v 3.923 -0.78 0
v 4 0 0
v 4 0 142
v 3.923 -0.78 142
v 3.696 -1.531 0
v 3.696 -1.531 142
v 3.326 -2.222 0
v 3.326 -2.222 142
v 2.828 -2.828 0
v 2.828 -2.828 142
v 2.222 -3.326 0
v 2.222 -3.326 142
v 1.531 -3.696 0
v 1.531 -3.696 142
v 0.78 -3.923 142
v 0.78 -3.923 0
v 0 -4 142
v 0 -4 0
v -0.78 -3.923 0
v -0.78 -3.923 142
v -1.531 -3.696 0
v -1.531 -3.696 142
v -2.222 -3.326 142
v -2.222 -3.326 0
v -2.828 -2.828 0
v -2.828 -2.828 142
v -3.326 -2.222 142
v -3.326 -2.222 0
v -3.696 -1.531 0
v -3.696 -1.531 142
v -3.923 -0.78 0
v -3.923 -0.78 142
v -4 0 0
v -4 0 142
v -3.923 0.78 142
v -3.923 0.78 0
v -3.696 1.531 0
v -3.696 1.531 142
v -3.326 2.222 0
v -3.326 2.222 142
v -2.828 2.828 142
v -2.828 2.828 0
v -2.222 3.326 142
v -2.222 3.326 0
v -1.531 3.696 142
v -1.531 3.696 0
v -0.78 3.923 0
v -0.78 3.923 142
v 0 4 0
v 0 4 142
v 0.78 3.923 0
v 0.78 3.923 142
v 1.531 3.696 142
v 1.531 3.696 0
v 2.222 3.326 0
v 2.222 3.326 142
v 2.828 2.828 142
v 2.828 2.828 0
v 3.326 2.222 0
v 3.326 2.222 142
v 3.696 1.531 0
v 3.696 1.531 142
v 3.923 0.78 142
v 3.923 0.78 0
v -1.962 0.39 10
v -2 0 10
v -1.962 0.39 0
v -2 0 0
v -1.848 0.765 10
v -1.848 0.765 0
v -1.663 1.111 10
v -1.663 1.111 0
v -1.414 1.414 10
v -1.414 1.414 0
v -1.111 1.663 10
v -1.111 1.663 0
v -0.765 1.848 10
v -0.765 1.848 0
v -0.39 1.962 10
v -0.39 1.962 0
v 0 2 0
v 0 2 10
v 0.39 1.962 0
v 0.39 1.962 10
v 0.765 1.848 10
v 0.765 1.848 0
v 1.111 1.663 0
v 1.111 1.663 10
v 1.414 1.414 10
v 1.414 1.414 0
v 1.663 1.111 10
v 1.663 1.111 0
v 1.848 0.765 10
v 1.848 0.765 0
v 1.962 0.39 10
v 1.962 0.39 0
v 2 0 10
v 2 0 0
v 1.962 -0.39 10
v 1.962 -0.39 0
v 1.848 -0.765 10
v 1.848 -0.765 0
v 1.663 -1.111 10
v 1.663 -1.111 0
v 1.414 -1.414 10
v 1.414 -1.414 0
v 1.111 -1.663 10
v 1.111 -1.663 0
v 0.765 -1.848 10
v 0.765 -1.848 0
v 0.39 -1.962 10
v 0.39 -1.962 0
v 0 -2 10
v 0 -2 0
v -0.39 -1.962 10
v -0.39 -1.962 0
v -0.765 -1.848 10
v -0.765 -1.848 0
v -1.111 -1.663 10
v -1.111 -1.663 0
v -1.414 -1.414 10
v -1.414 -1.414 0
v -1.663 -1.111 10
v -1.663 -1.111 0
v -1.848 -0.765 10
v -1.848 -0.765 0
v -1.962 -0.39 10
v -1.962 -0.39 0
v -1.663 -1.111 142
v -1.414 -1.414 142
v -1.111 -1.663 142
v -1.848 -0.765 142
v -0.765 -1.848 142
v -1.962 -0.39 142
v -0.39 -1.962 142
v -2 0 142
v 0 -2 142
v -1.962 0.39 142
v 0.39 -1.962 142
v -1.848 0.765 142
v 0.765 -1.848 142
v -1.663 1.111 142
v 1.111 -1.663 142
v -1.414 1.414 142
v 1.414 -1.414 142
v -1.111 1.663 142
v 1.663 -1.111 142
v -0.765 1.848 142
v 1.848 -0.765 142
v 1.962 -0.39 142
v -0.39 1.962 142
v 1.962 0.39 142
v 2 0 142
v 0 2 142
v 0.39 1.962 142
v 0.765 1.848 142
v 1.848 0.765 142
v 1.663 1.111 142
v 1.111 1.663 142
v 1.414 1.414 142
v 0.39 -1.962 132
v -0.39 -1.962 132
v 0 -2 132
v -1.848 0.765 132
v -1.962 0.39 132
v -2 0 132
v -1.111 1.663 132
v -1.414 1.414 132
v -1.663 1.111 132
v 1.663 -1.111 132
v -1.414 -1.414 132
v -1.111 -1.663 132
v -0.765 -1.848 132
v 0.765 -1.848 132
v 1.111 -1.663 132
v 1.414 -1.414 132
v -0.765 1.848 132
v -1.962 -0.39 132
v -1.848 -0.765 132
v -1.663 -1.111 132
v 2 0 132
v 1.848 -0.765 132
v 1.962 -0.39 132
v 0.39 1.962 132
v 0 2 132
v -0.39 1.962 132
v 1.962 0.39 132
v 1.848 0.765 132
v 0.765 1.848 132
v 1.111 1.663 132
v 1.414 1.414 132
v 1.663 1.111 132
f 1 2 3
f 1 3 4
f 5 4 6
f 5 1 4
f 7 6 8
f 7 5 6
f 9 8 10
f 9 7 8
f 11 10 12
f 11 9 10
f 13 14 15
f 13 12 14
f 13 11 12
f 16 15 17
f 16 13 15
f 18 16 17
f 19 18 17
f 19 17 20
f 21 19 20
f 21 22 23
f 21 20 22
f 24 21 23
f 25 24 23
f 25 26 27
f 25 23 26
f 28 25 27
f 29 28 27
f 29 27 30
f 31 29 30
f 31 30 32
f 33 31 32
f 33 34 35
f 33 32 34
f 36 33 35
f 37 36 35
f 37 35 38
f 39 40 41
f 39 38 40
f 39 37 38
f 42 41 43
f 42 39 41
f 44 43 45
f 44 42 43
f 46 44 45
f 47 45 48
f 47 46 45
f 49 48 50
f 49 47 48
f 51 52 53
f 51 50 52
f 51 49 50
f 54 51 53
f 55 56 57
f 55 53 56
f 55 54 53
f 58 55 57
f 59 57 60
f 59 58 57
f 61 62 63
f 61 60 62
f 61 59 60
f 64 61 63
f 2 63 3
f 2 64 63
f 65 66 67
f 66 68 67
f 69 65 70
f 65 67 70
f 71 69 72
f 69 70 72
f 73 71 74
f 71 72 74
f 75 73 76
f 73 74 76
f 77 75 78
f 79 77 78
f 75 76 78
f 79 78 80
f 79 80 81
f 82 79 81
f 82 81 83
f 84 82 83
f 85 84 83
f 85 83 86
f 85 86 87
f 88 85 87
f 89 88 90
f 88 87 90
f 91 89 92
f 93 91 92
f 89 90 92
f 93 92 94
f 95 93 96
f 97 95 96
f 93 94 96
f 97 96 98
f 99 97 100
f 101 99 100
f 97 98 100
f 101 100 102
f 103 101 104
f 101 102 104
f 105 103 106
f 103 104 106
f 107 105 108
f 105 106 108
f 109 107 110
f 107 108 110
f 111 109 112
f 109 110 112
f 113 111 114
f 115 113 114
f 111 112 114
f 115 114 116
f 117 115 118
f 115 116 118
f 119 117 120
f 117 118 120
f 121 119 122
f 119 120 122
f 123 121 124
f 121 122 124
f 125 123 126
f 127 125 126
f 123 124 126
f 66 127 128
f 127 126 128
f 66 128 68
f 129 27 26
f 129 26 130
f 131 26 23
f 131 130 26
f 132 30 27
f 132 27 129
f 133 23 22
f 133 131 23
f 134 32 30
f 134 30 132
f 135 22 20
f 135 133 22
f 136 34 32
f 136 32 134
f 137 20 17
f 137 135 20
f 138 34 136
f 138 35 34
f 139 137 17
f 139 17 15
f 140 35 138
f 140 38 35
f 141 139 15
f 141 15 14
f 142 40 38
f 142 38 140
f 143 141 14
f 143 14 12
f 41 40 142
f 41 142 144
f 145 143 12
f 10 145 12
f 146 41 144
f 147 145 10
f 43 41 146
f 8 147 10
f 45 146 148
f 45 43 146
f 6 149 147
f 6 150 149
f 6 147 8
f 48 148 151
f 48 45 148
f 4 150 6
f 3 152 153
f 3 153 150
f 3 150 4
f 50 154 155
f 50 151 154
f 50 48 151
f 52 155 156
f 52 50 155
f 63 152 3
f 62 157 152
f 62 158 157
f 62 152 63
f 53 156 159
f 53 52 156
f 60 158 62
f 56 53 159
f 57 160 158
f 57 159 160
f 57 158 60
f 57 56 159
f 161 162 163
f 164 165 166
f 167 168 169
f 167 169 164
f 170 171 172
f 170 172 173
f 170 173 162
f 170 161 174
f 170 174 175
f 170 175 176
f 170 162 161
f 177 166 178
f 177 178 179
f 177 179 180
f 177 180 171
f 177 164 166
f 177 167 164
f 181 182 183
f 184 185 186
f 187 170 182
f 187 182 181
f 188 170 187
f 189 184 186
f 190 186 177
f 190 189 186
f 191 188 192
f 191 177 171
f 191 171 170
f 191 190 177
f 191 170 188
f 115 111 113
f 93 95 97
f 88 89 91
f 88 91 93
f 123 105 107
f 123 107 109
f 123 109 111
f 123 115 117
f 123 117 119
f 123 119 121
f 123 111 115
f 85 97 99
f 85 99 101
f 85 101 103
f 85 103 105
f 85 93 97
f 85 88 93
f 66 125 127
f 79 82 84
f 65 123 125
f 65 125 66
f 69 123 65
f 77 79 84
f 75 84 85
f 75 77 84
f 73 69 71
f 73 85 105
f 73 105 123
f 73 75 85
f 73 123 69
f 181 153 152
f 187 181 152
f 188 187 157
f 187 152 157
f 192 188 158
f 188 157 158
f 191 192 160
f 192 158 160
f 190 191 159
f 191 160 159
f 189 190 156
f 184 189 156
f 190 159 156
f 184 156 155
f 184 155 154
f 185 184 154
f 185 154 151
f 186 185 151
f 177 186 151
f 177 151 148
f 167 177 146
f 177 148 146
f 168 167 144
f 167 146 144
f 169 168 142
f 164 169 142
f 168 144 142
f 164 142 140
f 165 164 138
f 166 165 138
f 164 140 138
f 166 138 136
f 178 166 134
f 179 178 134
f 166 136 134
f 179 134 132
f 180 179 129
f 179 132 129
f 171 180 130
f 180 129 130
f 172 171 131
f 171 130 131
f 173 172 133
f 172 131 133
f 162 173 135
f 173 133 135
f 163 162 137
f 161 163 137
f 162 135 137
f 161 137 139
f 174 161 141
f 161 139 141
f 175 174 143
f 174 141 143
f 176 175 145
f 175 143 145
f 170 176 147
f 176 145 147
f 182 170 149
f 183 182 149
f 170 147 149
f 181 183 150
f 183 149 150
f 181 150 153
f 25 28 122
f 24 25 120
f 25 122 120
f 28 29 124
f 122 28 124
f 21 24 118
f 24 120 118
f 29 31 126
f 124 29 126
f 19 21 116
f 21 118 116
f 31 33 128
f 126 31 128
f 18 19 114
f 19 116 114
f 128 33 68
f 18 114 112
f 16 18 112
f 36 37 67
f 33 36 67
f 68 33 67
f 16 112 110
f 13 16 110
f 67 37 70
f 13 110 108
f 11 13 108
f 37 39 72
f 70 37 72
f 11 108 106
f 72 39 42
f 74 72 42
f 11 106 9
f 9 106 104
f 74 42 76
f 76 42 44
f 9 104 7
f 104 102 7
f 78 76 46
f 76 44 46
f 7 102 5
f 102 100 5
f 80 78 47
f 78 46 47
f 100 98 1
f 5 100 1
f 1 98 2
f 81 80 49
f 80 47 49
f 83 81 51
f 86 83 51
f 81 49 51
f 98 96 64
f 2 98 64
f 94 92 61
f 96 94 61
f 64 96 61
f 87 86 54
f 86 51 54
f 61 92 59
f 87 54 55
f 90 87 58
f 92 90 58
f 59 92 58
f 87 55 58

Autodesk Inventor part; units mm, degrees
ref_plane "YZ Plane" through (0, 0, 0) normal (1, 0, 0) x (0, 1, 0)
ref_plane "XZ Plane" through (0, 0, 0) normal (0, 1, 0) x (-1, 0, 0)
ref_plane "XY Plane" through (0, 0, 0) normal (0, 0, 1) x (1, 0, 0)
sketch "スケッチ1" plane through (0, 0, 0) normal (0, 0, 1) x (1, 0, 0)
  circle A0 centre (0, 0) radius 4
  dimension "d0" = 8
extrude "押し出し1" add sketch "スケッチ1" along normal blind 142
sketch "スケッチ2" plane through (0, 0, 142) normal (0, 0, 1) x (1, 0, 0)
  circle A0 centre (0, 0) radius 2
  dimension "d3" = 4
extrude "押し出し2" cut sketch "スケッチ2" against normal blind 10
sketch "スケッチ3" plane through (0, 0, 0) normal (0, 0, -1) x (-1, 0, 0)
  circle A0 centre (0, 0) radius 2
  dimension "d6" = 4
extrude "押し出し3" cut sketch "スケッチ3" against normal blind 10
thread "ねじ1" size "M4x0.7" class "6H" standard "ANSI Metric M Profile" full length
thread "ねじ2" size "M4x0.7" class "6H" standard "ANSI Metric M Profile" full length
properties part number "シャフト" material "ポリカーボネート、スモーク"
